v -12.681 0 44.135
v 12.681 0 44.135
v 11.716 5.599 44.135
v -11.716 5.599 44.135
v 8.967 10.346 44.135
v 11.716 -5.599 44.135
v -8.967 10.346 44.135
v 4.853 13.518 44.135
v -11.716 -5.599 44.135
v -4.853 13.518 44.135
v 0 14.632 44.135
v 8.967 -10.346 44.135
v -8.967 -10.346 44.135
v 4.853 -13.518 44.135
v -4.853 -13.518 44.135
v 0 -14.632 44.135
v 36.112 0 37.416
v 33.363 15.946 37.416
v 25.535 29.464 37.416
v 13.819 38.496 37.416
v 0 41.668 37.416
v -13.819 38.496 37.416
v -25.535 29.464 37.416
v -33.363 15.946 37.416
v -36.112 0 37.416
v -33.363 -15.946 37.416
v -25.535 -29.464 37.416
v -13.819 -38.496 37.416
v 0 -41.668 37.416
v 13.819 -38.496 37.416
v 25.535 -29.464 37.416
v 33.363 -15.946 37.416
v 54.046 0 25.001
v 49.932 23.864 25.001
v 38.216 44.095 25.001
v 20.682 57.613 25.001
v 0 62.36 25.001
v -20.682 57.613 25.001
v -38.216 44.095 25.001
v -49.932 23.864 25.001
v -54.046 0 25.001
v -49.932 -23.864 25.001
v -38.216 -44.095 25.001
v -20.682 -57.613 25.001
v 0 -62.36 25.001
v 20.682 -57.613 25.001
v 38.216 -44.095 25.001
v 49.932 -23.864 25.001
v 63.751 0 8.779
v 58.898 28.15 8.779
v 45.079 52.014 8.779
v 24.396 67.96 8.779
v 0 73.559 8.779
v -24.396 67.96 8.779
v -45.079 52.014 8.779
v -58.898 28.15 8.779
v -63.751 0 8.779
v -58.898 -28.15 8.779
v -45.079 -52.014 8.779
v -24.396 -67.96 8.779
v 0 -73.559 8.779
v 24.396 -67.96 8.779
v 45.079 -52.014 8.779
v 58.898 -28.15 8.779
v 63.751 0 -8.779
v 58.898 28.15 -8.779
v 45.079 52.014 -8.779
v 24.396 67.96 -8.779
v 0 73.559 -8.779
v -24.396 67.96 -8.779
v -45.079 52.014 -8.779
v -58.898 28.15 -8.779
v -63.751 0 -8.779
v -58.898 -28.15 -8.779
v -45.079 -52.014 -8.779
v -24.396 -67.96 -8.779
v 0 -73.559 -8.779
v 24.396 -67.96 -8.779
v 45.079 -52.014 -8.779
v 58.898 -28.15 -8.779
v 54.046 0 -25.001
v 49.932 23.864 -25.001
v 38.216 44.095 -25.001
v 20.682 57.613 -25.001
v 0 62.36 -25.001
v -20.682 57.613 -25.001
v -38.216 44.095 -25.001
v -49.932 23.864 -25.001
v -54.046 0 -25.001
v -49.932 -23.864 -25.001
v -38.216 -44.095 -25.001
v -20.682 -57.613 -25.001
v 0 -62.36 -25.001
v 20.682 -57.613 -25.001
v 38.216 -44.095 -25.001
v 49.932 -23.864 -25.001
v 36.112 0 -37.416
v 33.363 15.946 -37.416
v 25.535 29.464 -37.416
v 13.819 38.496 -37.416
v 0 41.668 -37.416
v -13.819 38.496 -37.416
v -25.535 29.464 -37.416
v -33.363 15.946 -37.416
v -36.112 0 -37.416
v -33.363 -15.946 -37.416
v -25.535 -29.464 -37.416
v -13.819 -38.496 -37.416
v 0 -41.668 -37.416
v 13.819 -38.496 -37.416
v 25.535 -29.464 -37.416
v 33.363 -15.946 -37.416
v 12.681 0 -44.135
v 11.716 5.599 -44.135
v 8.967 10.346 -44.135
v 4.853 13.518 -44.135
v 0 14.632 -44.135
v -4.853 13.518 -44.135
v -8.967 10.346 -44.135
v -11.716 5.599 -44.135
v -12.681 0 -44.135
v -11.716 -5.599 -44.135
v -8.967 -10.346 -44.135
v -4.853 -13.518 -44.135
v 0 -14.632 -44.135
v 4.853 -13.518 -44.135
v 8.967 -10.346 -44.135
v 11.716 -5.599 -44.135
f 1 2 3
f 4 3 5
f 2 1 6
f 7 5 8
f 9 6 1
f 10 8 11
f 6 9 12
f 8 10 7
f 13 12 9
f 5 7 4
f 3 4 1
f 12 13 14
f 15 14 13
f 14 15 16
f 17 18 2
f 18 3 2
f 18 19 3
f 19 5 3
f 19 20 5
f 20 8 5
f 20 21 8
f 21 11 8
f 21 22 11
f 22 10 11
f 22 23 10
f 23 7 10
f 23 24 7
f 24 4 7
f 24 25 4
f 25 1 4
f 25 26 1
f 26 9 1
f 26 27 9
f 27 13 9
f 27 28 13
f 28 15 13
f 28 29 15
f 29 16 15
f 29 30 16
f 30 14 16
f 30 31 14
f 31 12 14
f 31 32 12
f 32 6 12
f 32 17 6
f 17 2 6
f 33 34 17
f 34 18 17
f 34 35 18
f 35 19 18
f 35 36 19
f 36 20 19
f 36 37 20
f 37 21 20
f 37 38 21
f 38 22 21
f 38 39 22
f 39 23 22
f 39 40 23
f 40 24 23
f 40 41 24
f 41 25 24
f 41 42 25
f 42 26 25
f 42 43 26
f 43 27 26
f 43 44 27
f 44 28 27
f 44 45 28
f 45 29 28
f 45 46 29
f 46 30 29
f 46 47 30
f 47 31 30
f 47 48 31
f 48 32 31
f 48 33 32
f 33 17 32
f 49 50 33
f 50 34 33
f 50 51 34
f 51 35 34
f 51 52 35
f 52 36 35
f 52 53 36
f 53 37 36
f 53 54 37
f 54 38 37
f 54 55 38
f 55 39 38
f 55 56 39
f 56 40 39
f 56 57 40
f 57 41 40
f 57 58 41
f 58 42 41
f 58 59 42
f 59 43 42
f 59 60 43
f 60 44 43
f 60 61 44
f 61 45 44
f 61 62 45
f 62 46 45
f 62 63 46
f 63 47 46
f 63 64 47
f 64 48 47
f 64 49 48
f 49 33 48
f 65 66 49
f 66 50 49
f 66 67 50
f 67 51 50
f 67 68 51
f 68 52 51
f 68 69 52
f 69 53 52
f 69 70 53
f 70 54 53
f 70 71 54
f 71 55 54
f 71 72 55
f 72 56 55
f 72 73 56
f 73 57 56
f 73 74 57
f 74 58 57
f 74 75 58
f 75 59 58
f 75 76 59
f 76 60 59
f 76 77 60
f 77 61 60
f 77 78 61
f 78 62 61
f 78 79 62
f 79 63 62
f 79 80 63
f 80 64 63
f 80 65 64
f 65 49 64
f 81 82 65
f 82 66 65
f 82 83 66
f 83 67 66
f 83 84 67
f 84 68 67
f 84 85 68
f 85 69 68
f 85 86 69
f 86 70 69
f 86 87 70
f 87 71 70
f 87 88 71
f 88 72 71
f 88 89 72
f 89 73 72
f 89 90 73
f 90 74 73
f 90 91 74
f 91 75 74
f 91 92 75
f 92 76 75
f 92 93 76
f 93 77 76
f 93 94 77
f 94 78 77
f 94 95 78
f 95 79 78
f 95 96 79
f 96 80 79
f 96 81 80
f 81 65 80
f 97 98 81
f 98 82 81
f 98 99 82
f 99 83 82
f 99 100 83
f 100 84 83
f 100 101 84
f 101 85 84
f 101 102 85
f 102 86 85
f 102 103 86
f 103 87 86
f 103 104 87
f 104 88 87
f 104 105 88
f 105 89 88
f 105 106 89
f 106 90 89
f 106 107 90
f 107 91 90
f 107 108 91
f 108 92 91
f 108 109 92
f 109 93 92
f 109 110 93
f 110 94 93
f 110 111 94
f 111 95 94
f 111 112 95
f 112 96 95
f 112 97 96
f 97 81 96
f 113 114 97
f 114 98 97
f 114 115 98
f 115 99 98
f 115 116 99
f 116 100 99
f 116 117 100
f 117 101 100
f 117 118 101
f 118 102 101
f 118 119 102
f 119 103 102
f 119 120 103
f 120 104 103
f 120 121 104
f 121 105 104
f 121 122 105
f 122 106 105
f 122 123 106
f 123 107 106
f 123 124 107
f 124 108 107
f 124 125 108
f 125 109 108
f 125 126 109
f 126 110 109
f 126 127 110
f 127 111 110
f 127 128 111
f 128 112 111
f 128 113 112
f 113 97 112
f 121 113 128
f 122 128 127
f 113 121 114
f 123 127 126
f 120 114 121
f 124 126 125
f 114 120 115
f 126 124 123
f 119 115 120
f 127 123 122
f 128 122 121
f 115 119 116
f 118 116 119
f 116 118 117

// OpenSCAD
// Generated by SolidPython 1.0.1 on 2020-07-29 00:46:51


scale(v = [13, 15, 9]) {
	sphere(r = 5);
}
/***********************************************
*********      SolidPython code:      **********
************************************************
 
# import packages: SolidPython
from solid import *
from solid.utils import *
from itertools import chain, combinations, permutations


class Resize:

    def __init__(self, scad_file):
        self.scad_file = scad_file
        #self.scad_file = import_scad(scad_file)
        # cone/cylinder param:
        self.r1 = 0
        self.r2 = 0
        self.h = 0
        # rectangular prism param:
        self.w = 0
        self.l = 0
        # ellipse param:
        self.r = 0

    # import OpenScad code (file name corresponds to shape)


    # classify shape + parameters
    def assign(self, param1, param2, param3):
        if self.scad_file == 'cone.scad':
            self.r1 = param1
            self.r2 = param2
            self.h = param3
        elif self.scad_file == 'cylinder.scad':
            self.r1 = param1
            self.r2 = param2
            self.h = param3
        elif self.scad_file == 'rectangularPrism.scad':
            self.h = param1
            self.l = param2
            self.w = param3
        else:
            self.r = param1
            self.h = param2

    # resize parameters
    def iterate(self):
        x = range(3, 20, 2)
        i = 1
        if self.scad_file == 'cone.scad':
            tempList = list(permutations(x, 2))
            for temp in tempList:
                param1 = temp[0]
                param2 = temp[1]
                filepath = 'produced_scad_files/' + 'cone' + str(param1) + '_' + str(param2) + '_' + '.scad'
                scad_render_to_file(cylinder(h=param1, r1=param2, r2=0), filepath)

        elif self.scad_file == 'cylinder.scad':
            tempList = list(permutations(x, 3))
            for temp in tempList:
                param1 = temp[0]
                param2 = temp[1]
                filepath = 'produced_scad_files/' + 'cylinder' + str(param1) + '_' + str(param2) + '_' + '.scad'
                scad_render_to_file(cylinder(h=param1, r1=param2, r2=param2), filepath)

        elif self.scad_file == 'rectangularPrism.scad':
            tempList = list(permutations(x, 3))
            for temp in tempList:
                param1 = temp[0]
                param2 = temp[1]
                param3 = temp[2]
                filepath = 'produced_scad_files/' + 'rectangularPrism' + str(param1) + '_' + str(param2) + '_' + str(
                    param3) + '.scad'
                scad_render_to_file(cube(size=(param1, param2, param3)), filepath)

        elif self.scad_file == 'ellipse.scad':
            tempList = list(permutations(x, 4))
            for temp in tempList:
                param1 = temp[0]
                param2 = temp[1]
                param3 = temp[2]
                param4 = temp[3]
                filepath = 'produced_scad_files/' + 'ellipse' + str(param1) + '_' + str(param2) + '_' + str(param3) + '_' + str(param4) + '.scad'
                scad_render_to_file(scale([param1, param2, param3])(sphere(r=param4)), filepath)

    def render_to_scadfile(self):
        scad_render_to_file(scad, 'example.scad') 
 
************************************************/
